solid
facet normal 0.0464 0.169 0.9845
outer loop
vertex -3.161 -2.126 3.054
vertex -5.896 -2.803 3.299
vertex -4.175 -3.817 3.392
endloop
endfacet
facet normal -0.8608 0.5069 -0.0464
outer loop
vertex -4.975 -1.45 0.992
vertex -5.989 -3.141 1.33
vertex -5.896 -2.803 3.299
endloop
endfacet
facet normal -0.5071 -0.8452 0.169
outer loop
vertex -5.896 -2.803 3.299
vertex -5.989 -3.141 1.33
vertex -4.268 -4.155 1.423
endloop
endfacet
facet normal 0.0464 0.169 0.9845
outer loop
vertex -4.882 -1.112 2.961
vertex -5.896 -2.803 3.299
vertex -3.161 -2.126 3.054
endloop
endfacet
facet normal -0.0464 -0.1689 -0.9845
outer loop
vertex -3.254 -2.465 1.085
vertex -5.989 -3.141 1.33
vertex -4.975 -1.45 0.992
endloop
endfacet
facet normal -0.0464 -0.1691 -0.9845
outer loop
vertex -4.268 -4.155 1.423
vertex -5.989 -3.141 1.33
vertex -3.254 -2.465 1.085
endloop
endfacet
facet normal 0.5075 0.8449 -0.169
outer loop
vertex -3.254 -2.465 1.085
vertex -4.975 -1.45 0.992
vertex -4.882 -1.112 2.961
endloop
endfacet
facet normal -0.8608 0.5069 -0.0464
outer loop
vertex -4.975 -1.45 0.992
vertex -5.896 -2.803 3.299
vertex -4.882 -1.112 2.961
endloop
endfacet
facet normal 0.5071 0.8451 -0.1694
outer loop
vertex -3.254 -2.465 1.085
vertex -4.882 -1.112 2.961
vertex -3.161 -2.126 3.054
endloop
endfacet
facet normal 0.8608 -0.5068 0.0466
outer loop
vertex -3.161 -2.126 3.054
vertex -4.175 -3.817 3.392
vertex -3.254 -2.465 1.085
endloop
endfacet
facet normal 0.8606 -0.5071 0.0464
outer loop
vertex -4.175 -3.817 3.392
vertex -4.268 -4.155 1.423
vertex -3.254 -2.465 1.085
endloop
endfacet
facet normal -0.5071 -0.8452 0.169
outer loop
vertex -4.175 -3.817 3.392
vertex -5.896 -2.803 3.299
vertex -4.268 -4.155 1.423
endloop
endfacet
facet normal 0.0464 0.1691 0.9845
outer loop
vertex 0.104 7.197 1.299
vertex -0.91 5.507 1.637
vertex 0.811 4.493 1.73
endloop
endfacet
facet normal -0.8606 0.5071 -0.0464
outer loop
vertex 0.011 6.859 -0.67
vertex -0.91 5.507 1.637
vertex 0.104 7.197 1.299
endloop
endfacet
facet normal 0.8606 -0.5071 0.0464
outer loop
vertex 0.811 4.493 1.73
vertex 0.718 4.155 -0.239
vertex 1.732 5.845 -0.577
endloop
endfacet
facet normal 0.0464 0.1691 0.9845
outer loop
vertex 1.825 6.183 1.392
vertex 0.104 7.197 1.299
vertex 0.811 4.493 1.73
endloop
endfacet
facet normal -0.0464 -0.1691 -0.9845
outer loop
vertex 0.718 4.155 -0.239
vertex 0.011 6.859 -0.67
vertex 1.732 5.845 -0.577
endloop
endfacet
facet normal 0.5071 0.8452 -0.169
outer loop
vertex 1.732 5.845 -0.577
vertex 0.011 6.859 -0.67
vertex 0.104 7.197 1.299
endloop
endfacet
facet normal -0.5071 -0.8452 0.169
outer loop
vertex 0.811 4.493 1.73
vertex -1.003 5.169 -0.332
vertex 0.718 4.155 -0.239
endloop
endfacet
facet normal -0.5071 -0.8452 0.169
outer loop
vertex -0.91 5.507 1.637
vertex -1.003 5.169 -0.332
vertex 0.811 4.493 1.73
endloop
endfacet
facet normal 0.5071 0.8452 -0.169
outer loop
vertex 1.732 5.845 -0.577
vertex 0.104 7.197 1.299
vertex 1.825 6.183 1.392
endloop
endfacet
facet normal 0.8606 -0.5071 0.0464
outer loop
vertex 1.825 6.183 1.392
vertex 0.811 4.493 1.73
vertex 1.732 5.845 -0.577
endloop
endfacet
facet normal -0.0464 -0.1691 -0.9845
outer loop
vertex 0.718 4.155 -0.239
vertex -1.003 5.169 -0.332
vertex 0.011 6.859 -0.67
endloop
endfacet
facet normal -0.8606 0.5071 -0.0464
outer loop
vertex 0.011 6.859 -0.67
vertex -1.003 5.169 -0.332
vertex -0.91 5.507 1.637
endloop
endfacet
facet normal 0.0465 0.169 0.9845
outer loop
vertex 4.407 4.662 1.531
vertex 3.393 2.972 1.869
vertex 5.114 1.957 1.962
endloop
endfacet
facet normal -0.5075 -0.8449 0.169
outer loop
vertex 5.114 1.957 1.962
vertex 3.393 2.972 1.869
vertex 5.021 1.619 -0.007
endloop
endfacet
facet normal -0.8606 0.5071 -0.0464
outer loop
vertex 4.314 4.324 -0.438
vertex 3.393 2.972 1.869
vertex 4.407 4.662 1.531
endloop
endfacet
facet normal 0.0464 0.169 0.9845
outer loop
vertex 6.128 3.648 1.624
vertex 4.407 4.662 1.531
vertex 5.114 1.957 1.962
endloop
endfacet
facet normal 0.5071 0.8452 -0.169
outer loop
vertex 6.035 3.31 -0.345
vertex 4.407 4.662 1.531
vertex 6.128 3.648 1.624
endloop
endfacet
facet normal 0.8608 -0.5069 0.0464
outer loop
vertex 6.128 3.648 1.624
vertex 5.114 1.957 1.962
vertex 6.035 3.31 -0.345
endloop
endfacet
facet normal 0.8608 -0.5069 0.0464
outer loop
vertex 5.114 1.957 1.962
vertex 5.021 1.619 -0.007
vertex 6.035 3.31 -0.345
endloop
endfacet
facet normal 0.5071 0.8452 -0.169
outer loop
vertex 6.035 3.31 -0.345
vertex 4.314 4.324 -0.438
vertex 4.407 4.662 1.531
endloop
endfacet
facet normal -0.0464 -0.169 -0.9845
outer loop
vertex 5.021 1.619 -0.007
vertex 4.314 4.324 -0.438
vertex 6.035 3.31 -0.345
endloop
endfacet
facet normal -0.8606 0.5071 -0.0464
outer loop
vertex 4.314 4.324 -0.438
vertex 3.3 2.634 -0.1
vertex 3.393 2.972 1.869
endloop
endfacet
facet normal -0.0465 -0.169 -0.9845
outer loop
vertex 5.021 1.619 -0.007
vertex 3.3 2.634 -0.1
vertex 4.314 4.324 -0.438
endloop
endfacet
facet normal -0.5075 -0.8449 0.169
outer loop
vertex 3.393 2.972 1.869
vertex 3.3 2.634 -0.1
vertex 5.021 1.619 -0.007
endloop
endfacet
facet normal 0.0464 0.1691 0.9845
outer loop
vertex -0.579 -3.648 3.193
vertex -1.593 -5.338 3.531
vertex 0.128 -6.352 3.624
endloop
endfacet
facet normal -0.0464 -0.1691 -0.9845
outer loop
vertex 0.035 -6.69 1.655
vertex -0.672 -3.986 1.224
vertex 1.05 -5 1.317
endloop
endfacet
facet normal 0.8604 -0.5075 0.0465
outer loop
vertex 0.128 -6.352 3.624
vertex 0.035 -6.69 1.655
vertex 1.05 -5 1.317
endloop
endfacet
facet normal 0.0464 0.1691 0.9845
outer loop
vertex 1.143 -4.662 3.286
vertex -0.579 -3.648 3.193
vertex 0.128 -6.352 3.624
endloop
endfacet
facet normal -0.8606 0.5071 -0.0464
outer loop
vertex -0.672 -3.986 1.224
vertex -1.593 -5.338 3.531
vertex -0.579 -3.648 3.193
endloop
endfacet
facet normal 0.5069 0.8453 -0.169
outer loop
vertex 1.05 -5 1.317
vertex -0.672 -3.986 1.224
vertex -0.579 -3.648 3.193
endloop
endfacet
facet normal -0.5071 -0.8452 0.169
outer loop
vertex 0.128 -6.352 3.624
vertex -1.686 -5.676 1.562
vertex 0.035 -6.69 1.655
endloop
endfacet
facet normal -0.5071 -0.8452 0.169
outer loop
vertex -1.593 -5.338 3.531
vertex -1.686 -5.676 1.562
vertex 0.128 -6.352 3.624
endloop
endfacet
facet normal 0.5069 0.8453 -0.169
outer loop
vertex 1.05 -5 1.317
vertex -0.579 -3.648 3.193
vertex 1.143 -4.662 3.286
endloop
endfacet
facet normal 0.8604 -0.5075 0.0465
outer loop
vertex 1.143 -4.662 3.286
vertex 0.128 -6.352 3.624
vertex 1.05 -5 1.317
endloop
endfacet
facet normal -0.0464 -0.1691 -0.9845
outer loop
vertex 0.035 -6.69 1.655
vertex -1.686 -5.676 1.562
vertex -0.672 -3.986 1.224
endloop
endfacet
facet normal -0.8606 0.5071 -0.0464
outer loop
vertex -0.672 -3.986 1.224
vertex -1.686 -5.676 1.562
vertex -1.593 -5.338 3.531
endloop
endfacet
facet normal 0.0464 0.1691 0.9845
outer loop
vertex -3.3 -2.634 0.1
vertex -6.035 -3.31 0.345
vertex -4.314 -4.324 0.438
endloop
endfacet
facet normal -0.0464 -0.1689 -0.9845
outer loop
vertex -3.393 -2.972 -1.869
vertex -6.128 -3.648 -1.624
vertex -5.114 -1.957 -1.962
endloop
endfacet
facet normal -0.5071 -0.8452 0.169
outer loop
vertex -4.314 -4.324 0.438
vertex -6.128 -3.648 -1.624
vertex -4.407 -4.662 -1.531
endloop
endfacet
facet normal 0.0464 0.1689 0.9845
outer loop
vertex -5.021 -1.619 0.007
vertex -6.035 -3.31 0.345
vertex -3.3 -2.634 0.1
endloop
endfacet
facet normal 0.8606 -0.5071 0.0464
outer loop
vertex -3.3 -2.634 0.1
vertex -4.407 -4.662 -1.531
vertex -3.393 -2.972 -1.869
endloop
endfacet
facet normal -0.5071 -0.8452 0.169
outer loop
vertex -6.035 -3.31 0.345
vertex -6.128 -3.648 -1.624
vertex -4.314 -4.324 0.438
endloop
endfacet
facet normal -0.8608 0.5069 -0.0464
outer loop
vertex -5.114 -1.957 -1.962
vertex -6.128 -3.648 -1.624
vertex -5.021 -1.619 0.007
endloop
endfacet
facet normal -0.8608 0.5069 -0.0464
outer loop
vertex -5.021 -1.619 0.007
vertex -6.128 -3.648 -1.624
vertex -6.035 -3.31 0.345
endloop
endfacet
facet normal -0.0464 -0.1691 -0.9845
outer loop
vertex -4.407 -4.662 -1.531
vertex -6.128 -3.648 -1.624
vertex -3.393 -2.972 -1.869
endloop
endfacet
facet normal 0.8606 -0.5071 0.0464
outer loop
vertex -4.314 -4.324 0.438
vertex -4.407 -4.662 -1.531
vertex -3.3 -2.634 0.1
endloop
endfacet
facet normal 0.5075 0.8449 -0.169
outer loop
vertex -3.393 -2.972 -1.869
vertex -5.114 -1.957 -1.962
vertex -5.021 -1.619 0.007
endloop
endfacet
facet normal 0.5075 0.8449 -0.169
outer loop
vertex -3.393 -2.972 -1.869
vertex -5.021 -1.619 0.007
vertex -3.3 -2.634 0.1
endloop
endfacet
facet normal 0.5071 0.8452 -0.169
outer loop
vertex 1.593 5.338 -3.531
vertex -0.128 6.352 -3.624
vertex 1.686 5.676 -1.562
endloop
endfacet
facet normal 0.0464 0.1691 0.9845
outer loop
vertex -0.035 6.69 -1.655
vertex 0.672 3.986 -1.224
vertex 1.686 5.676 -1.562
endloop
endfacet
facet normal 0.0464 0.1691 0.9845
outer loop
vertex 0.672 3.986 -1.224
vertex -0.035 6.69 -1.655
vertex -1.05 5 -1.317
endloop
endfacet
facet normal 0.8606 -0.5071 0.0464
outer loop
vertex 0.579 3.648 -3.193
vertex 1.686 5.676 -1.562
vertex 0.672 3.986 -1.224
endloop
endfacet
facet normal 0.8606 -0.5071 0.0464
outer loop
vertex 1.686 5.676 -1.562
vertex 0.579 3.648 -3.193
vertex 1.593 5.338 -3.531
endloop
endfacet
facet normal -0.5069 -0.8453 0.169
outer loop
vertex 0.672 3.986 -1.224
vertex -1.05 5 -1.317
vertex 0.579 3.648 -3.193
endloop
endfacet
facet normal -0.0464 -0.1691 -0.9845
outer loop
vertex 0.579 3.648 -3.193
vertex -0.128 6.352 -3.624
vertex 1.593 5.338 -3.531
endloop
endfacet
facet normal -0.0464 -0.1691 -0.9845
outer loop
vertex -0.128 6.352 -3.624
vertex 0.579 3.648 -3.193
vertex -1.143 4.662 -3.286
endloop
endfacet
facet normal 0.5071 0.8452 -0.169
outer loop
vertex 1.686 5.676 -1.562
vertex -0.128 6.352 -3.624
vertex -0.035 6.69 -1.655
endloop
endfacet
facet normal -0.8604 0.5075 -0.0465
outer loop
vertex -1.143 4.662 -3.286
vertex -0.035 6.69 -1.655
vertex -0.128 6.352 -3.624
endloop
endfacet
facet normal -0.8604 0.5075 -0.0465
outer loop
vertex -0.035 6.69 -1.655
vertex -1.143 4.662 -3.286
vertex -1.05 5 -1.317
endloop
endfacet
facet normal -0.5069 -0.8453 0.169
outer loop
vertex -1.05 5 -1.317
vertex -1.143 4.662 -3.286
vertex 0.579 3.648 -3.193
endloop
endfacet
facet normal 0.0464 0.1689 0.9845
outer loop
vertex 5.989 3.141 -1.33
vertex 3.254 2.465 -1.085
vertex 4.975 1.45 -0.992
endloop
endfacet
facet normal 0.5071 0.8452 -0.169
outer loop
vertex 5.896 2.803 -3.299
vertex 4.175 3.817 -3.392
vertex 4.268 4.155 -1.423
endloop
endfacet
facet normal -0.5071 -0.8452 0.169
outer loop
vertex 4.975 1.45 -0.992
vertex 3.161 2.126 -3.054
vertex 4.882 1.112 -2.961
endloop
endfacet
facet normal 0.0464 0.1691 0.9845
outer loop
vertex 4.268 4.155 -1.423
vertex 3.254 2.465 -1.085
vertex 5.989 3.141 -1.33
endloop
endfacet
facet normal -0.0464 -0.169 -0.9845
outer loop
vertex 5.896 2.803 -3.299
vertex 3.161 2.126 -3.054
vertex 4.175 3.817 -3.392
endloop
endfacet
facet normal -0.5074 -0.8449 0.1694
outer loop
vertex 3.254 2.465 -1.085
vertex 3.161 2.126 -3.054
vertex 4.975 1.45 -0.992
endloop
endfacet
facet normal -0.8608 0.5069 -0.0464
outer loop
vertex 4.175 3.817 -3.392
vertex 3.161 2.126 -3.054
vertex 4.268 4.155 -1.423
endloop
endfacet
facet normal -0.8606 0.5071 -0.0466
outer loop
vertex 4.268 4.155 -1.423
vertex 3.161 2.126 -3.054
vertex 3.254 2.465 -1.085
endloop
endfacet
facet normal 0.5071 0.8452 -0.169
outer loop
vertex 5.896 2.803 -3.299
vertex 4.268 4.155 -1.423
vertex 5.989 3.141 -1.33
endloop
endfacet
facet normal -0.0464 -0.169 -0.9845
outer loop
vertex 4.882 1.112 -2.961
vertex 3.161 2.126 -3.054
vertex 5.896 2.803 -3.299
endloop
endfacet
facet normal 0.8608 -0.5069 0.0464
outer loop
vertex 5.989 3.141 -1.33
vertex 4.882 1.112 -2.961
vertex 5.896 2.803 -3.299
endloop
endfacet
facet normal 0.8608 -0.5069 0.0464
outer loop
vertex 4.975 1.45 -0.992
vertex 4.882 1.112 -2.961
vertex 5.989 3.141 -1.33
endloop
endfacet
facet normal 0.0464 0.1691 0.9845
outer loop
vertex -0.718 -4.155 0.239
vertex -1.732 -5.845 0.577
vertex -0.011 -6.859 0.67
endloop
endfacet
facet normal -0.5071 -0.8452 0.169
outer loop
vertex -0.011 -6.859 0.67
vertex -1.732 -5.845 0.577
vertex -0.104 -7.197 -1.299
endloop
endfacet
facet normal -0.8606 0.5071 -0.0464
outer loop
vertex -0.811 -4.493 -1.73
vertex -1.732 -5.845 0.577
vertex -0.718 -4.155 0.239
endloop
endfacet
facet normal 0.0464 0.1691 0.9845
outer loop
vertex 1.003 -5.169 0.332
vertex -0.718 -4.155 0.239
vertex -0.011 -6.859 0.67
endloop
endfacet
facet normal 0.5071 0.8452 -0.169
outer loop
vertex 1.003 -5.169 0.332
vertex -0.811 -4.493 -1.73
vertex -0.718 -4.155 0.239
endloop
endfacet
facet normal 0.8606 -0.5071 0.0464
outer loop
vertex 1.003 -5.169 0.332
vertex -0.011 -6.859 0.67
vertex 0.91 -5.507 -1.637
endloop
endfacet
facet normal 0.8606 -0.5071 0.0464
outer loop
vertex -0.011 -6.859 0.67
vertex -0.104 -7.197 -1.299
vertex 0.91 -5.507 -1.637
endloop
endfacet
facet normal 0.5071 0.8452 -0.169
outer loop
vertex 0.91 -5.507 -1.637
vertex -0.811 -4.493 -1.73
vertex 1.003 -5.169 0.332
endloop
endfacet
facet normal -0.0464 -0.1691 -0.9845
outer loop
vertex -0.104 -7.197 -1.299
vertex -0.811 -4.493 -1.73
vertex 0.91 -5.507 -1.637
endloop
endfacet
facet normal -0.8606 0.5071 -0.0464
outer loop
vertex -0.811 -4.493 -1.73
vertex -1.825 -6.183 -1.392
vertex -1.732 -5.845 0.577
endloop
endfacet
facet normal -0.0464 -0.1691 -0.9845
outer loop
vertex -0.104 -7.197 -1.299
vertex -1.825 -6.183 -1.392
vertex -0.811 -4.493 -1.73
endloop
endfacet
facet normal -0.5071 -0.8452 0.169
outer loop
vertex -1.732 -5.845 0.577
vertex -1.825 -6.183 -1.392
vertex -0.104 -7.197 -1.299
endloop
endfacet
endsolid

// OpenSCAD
$fn=7;
union()
{
	union()
	{
		translate([-5.9890094,-3.1406615,1.3296697])
		{
			rotate(32.31153,[-0.31622776,0,-0.94868326])
			{
				cube([2,2,2]);
			}
		}
		translate([-1.0031943,5.169031,-0.3322686])
		{
			rotate(32.31153,[-0.31622776,0,-0.94868326])
			{
				cube([2,2,2]);
			}
		}
		translate([3.2999997,2.6335685,-0.100000024])
		{
			rotate(32.31153,[-0.31622776,0,-0.94868326])
			{
				cube([2,2,2]);
			}
		}
		translate([-1.6858153,-5.676124,1.5619383])
		{
			rotate(32.31153,[-0.31622776,0,-0.94868326])
			{
				cube([2,2,2]);
			}
		}
	}
	union()
	{
		translate([-6.1283703,-3.647754,-1.6238766])
		{
			rotate(32.31153,[-0.31622776,0,-0.94868326])
			{
				cube([2,2,2]);
			}
		}
		translate([-1.1425552,4.6619387,-3.2858148])
		{
			rotate(32.31153,[-0.31622776,0,-0.94868326])
			{
				cube([2,2,2]);
			}
		}
		translate([3.1606388,2.126476,-3.0535464])
		{
			rotate(32.31153,[-0.31622776,0,-0.94868326])
			{
				cube([2,2,2]);
			}
		}
		translate([-1.8251762,-6.1832166,-1.391608])
		{
			rotate(32.31153,[-0.31622776,0,-0.94868326])
			{
				cube([2,2,2]);
			}
		}
	}
}
